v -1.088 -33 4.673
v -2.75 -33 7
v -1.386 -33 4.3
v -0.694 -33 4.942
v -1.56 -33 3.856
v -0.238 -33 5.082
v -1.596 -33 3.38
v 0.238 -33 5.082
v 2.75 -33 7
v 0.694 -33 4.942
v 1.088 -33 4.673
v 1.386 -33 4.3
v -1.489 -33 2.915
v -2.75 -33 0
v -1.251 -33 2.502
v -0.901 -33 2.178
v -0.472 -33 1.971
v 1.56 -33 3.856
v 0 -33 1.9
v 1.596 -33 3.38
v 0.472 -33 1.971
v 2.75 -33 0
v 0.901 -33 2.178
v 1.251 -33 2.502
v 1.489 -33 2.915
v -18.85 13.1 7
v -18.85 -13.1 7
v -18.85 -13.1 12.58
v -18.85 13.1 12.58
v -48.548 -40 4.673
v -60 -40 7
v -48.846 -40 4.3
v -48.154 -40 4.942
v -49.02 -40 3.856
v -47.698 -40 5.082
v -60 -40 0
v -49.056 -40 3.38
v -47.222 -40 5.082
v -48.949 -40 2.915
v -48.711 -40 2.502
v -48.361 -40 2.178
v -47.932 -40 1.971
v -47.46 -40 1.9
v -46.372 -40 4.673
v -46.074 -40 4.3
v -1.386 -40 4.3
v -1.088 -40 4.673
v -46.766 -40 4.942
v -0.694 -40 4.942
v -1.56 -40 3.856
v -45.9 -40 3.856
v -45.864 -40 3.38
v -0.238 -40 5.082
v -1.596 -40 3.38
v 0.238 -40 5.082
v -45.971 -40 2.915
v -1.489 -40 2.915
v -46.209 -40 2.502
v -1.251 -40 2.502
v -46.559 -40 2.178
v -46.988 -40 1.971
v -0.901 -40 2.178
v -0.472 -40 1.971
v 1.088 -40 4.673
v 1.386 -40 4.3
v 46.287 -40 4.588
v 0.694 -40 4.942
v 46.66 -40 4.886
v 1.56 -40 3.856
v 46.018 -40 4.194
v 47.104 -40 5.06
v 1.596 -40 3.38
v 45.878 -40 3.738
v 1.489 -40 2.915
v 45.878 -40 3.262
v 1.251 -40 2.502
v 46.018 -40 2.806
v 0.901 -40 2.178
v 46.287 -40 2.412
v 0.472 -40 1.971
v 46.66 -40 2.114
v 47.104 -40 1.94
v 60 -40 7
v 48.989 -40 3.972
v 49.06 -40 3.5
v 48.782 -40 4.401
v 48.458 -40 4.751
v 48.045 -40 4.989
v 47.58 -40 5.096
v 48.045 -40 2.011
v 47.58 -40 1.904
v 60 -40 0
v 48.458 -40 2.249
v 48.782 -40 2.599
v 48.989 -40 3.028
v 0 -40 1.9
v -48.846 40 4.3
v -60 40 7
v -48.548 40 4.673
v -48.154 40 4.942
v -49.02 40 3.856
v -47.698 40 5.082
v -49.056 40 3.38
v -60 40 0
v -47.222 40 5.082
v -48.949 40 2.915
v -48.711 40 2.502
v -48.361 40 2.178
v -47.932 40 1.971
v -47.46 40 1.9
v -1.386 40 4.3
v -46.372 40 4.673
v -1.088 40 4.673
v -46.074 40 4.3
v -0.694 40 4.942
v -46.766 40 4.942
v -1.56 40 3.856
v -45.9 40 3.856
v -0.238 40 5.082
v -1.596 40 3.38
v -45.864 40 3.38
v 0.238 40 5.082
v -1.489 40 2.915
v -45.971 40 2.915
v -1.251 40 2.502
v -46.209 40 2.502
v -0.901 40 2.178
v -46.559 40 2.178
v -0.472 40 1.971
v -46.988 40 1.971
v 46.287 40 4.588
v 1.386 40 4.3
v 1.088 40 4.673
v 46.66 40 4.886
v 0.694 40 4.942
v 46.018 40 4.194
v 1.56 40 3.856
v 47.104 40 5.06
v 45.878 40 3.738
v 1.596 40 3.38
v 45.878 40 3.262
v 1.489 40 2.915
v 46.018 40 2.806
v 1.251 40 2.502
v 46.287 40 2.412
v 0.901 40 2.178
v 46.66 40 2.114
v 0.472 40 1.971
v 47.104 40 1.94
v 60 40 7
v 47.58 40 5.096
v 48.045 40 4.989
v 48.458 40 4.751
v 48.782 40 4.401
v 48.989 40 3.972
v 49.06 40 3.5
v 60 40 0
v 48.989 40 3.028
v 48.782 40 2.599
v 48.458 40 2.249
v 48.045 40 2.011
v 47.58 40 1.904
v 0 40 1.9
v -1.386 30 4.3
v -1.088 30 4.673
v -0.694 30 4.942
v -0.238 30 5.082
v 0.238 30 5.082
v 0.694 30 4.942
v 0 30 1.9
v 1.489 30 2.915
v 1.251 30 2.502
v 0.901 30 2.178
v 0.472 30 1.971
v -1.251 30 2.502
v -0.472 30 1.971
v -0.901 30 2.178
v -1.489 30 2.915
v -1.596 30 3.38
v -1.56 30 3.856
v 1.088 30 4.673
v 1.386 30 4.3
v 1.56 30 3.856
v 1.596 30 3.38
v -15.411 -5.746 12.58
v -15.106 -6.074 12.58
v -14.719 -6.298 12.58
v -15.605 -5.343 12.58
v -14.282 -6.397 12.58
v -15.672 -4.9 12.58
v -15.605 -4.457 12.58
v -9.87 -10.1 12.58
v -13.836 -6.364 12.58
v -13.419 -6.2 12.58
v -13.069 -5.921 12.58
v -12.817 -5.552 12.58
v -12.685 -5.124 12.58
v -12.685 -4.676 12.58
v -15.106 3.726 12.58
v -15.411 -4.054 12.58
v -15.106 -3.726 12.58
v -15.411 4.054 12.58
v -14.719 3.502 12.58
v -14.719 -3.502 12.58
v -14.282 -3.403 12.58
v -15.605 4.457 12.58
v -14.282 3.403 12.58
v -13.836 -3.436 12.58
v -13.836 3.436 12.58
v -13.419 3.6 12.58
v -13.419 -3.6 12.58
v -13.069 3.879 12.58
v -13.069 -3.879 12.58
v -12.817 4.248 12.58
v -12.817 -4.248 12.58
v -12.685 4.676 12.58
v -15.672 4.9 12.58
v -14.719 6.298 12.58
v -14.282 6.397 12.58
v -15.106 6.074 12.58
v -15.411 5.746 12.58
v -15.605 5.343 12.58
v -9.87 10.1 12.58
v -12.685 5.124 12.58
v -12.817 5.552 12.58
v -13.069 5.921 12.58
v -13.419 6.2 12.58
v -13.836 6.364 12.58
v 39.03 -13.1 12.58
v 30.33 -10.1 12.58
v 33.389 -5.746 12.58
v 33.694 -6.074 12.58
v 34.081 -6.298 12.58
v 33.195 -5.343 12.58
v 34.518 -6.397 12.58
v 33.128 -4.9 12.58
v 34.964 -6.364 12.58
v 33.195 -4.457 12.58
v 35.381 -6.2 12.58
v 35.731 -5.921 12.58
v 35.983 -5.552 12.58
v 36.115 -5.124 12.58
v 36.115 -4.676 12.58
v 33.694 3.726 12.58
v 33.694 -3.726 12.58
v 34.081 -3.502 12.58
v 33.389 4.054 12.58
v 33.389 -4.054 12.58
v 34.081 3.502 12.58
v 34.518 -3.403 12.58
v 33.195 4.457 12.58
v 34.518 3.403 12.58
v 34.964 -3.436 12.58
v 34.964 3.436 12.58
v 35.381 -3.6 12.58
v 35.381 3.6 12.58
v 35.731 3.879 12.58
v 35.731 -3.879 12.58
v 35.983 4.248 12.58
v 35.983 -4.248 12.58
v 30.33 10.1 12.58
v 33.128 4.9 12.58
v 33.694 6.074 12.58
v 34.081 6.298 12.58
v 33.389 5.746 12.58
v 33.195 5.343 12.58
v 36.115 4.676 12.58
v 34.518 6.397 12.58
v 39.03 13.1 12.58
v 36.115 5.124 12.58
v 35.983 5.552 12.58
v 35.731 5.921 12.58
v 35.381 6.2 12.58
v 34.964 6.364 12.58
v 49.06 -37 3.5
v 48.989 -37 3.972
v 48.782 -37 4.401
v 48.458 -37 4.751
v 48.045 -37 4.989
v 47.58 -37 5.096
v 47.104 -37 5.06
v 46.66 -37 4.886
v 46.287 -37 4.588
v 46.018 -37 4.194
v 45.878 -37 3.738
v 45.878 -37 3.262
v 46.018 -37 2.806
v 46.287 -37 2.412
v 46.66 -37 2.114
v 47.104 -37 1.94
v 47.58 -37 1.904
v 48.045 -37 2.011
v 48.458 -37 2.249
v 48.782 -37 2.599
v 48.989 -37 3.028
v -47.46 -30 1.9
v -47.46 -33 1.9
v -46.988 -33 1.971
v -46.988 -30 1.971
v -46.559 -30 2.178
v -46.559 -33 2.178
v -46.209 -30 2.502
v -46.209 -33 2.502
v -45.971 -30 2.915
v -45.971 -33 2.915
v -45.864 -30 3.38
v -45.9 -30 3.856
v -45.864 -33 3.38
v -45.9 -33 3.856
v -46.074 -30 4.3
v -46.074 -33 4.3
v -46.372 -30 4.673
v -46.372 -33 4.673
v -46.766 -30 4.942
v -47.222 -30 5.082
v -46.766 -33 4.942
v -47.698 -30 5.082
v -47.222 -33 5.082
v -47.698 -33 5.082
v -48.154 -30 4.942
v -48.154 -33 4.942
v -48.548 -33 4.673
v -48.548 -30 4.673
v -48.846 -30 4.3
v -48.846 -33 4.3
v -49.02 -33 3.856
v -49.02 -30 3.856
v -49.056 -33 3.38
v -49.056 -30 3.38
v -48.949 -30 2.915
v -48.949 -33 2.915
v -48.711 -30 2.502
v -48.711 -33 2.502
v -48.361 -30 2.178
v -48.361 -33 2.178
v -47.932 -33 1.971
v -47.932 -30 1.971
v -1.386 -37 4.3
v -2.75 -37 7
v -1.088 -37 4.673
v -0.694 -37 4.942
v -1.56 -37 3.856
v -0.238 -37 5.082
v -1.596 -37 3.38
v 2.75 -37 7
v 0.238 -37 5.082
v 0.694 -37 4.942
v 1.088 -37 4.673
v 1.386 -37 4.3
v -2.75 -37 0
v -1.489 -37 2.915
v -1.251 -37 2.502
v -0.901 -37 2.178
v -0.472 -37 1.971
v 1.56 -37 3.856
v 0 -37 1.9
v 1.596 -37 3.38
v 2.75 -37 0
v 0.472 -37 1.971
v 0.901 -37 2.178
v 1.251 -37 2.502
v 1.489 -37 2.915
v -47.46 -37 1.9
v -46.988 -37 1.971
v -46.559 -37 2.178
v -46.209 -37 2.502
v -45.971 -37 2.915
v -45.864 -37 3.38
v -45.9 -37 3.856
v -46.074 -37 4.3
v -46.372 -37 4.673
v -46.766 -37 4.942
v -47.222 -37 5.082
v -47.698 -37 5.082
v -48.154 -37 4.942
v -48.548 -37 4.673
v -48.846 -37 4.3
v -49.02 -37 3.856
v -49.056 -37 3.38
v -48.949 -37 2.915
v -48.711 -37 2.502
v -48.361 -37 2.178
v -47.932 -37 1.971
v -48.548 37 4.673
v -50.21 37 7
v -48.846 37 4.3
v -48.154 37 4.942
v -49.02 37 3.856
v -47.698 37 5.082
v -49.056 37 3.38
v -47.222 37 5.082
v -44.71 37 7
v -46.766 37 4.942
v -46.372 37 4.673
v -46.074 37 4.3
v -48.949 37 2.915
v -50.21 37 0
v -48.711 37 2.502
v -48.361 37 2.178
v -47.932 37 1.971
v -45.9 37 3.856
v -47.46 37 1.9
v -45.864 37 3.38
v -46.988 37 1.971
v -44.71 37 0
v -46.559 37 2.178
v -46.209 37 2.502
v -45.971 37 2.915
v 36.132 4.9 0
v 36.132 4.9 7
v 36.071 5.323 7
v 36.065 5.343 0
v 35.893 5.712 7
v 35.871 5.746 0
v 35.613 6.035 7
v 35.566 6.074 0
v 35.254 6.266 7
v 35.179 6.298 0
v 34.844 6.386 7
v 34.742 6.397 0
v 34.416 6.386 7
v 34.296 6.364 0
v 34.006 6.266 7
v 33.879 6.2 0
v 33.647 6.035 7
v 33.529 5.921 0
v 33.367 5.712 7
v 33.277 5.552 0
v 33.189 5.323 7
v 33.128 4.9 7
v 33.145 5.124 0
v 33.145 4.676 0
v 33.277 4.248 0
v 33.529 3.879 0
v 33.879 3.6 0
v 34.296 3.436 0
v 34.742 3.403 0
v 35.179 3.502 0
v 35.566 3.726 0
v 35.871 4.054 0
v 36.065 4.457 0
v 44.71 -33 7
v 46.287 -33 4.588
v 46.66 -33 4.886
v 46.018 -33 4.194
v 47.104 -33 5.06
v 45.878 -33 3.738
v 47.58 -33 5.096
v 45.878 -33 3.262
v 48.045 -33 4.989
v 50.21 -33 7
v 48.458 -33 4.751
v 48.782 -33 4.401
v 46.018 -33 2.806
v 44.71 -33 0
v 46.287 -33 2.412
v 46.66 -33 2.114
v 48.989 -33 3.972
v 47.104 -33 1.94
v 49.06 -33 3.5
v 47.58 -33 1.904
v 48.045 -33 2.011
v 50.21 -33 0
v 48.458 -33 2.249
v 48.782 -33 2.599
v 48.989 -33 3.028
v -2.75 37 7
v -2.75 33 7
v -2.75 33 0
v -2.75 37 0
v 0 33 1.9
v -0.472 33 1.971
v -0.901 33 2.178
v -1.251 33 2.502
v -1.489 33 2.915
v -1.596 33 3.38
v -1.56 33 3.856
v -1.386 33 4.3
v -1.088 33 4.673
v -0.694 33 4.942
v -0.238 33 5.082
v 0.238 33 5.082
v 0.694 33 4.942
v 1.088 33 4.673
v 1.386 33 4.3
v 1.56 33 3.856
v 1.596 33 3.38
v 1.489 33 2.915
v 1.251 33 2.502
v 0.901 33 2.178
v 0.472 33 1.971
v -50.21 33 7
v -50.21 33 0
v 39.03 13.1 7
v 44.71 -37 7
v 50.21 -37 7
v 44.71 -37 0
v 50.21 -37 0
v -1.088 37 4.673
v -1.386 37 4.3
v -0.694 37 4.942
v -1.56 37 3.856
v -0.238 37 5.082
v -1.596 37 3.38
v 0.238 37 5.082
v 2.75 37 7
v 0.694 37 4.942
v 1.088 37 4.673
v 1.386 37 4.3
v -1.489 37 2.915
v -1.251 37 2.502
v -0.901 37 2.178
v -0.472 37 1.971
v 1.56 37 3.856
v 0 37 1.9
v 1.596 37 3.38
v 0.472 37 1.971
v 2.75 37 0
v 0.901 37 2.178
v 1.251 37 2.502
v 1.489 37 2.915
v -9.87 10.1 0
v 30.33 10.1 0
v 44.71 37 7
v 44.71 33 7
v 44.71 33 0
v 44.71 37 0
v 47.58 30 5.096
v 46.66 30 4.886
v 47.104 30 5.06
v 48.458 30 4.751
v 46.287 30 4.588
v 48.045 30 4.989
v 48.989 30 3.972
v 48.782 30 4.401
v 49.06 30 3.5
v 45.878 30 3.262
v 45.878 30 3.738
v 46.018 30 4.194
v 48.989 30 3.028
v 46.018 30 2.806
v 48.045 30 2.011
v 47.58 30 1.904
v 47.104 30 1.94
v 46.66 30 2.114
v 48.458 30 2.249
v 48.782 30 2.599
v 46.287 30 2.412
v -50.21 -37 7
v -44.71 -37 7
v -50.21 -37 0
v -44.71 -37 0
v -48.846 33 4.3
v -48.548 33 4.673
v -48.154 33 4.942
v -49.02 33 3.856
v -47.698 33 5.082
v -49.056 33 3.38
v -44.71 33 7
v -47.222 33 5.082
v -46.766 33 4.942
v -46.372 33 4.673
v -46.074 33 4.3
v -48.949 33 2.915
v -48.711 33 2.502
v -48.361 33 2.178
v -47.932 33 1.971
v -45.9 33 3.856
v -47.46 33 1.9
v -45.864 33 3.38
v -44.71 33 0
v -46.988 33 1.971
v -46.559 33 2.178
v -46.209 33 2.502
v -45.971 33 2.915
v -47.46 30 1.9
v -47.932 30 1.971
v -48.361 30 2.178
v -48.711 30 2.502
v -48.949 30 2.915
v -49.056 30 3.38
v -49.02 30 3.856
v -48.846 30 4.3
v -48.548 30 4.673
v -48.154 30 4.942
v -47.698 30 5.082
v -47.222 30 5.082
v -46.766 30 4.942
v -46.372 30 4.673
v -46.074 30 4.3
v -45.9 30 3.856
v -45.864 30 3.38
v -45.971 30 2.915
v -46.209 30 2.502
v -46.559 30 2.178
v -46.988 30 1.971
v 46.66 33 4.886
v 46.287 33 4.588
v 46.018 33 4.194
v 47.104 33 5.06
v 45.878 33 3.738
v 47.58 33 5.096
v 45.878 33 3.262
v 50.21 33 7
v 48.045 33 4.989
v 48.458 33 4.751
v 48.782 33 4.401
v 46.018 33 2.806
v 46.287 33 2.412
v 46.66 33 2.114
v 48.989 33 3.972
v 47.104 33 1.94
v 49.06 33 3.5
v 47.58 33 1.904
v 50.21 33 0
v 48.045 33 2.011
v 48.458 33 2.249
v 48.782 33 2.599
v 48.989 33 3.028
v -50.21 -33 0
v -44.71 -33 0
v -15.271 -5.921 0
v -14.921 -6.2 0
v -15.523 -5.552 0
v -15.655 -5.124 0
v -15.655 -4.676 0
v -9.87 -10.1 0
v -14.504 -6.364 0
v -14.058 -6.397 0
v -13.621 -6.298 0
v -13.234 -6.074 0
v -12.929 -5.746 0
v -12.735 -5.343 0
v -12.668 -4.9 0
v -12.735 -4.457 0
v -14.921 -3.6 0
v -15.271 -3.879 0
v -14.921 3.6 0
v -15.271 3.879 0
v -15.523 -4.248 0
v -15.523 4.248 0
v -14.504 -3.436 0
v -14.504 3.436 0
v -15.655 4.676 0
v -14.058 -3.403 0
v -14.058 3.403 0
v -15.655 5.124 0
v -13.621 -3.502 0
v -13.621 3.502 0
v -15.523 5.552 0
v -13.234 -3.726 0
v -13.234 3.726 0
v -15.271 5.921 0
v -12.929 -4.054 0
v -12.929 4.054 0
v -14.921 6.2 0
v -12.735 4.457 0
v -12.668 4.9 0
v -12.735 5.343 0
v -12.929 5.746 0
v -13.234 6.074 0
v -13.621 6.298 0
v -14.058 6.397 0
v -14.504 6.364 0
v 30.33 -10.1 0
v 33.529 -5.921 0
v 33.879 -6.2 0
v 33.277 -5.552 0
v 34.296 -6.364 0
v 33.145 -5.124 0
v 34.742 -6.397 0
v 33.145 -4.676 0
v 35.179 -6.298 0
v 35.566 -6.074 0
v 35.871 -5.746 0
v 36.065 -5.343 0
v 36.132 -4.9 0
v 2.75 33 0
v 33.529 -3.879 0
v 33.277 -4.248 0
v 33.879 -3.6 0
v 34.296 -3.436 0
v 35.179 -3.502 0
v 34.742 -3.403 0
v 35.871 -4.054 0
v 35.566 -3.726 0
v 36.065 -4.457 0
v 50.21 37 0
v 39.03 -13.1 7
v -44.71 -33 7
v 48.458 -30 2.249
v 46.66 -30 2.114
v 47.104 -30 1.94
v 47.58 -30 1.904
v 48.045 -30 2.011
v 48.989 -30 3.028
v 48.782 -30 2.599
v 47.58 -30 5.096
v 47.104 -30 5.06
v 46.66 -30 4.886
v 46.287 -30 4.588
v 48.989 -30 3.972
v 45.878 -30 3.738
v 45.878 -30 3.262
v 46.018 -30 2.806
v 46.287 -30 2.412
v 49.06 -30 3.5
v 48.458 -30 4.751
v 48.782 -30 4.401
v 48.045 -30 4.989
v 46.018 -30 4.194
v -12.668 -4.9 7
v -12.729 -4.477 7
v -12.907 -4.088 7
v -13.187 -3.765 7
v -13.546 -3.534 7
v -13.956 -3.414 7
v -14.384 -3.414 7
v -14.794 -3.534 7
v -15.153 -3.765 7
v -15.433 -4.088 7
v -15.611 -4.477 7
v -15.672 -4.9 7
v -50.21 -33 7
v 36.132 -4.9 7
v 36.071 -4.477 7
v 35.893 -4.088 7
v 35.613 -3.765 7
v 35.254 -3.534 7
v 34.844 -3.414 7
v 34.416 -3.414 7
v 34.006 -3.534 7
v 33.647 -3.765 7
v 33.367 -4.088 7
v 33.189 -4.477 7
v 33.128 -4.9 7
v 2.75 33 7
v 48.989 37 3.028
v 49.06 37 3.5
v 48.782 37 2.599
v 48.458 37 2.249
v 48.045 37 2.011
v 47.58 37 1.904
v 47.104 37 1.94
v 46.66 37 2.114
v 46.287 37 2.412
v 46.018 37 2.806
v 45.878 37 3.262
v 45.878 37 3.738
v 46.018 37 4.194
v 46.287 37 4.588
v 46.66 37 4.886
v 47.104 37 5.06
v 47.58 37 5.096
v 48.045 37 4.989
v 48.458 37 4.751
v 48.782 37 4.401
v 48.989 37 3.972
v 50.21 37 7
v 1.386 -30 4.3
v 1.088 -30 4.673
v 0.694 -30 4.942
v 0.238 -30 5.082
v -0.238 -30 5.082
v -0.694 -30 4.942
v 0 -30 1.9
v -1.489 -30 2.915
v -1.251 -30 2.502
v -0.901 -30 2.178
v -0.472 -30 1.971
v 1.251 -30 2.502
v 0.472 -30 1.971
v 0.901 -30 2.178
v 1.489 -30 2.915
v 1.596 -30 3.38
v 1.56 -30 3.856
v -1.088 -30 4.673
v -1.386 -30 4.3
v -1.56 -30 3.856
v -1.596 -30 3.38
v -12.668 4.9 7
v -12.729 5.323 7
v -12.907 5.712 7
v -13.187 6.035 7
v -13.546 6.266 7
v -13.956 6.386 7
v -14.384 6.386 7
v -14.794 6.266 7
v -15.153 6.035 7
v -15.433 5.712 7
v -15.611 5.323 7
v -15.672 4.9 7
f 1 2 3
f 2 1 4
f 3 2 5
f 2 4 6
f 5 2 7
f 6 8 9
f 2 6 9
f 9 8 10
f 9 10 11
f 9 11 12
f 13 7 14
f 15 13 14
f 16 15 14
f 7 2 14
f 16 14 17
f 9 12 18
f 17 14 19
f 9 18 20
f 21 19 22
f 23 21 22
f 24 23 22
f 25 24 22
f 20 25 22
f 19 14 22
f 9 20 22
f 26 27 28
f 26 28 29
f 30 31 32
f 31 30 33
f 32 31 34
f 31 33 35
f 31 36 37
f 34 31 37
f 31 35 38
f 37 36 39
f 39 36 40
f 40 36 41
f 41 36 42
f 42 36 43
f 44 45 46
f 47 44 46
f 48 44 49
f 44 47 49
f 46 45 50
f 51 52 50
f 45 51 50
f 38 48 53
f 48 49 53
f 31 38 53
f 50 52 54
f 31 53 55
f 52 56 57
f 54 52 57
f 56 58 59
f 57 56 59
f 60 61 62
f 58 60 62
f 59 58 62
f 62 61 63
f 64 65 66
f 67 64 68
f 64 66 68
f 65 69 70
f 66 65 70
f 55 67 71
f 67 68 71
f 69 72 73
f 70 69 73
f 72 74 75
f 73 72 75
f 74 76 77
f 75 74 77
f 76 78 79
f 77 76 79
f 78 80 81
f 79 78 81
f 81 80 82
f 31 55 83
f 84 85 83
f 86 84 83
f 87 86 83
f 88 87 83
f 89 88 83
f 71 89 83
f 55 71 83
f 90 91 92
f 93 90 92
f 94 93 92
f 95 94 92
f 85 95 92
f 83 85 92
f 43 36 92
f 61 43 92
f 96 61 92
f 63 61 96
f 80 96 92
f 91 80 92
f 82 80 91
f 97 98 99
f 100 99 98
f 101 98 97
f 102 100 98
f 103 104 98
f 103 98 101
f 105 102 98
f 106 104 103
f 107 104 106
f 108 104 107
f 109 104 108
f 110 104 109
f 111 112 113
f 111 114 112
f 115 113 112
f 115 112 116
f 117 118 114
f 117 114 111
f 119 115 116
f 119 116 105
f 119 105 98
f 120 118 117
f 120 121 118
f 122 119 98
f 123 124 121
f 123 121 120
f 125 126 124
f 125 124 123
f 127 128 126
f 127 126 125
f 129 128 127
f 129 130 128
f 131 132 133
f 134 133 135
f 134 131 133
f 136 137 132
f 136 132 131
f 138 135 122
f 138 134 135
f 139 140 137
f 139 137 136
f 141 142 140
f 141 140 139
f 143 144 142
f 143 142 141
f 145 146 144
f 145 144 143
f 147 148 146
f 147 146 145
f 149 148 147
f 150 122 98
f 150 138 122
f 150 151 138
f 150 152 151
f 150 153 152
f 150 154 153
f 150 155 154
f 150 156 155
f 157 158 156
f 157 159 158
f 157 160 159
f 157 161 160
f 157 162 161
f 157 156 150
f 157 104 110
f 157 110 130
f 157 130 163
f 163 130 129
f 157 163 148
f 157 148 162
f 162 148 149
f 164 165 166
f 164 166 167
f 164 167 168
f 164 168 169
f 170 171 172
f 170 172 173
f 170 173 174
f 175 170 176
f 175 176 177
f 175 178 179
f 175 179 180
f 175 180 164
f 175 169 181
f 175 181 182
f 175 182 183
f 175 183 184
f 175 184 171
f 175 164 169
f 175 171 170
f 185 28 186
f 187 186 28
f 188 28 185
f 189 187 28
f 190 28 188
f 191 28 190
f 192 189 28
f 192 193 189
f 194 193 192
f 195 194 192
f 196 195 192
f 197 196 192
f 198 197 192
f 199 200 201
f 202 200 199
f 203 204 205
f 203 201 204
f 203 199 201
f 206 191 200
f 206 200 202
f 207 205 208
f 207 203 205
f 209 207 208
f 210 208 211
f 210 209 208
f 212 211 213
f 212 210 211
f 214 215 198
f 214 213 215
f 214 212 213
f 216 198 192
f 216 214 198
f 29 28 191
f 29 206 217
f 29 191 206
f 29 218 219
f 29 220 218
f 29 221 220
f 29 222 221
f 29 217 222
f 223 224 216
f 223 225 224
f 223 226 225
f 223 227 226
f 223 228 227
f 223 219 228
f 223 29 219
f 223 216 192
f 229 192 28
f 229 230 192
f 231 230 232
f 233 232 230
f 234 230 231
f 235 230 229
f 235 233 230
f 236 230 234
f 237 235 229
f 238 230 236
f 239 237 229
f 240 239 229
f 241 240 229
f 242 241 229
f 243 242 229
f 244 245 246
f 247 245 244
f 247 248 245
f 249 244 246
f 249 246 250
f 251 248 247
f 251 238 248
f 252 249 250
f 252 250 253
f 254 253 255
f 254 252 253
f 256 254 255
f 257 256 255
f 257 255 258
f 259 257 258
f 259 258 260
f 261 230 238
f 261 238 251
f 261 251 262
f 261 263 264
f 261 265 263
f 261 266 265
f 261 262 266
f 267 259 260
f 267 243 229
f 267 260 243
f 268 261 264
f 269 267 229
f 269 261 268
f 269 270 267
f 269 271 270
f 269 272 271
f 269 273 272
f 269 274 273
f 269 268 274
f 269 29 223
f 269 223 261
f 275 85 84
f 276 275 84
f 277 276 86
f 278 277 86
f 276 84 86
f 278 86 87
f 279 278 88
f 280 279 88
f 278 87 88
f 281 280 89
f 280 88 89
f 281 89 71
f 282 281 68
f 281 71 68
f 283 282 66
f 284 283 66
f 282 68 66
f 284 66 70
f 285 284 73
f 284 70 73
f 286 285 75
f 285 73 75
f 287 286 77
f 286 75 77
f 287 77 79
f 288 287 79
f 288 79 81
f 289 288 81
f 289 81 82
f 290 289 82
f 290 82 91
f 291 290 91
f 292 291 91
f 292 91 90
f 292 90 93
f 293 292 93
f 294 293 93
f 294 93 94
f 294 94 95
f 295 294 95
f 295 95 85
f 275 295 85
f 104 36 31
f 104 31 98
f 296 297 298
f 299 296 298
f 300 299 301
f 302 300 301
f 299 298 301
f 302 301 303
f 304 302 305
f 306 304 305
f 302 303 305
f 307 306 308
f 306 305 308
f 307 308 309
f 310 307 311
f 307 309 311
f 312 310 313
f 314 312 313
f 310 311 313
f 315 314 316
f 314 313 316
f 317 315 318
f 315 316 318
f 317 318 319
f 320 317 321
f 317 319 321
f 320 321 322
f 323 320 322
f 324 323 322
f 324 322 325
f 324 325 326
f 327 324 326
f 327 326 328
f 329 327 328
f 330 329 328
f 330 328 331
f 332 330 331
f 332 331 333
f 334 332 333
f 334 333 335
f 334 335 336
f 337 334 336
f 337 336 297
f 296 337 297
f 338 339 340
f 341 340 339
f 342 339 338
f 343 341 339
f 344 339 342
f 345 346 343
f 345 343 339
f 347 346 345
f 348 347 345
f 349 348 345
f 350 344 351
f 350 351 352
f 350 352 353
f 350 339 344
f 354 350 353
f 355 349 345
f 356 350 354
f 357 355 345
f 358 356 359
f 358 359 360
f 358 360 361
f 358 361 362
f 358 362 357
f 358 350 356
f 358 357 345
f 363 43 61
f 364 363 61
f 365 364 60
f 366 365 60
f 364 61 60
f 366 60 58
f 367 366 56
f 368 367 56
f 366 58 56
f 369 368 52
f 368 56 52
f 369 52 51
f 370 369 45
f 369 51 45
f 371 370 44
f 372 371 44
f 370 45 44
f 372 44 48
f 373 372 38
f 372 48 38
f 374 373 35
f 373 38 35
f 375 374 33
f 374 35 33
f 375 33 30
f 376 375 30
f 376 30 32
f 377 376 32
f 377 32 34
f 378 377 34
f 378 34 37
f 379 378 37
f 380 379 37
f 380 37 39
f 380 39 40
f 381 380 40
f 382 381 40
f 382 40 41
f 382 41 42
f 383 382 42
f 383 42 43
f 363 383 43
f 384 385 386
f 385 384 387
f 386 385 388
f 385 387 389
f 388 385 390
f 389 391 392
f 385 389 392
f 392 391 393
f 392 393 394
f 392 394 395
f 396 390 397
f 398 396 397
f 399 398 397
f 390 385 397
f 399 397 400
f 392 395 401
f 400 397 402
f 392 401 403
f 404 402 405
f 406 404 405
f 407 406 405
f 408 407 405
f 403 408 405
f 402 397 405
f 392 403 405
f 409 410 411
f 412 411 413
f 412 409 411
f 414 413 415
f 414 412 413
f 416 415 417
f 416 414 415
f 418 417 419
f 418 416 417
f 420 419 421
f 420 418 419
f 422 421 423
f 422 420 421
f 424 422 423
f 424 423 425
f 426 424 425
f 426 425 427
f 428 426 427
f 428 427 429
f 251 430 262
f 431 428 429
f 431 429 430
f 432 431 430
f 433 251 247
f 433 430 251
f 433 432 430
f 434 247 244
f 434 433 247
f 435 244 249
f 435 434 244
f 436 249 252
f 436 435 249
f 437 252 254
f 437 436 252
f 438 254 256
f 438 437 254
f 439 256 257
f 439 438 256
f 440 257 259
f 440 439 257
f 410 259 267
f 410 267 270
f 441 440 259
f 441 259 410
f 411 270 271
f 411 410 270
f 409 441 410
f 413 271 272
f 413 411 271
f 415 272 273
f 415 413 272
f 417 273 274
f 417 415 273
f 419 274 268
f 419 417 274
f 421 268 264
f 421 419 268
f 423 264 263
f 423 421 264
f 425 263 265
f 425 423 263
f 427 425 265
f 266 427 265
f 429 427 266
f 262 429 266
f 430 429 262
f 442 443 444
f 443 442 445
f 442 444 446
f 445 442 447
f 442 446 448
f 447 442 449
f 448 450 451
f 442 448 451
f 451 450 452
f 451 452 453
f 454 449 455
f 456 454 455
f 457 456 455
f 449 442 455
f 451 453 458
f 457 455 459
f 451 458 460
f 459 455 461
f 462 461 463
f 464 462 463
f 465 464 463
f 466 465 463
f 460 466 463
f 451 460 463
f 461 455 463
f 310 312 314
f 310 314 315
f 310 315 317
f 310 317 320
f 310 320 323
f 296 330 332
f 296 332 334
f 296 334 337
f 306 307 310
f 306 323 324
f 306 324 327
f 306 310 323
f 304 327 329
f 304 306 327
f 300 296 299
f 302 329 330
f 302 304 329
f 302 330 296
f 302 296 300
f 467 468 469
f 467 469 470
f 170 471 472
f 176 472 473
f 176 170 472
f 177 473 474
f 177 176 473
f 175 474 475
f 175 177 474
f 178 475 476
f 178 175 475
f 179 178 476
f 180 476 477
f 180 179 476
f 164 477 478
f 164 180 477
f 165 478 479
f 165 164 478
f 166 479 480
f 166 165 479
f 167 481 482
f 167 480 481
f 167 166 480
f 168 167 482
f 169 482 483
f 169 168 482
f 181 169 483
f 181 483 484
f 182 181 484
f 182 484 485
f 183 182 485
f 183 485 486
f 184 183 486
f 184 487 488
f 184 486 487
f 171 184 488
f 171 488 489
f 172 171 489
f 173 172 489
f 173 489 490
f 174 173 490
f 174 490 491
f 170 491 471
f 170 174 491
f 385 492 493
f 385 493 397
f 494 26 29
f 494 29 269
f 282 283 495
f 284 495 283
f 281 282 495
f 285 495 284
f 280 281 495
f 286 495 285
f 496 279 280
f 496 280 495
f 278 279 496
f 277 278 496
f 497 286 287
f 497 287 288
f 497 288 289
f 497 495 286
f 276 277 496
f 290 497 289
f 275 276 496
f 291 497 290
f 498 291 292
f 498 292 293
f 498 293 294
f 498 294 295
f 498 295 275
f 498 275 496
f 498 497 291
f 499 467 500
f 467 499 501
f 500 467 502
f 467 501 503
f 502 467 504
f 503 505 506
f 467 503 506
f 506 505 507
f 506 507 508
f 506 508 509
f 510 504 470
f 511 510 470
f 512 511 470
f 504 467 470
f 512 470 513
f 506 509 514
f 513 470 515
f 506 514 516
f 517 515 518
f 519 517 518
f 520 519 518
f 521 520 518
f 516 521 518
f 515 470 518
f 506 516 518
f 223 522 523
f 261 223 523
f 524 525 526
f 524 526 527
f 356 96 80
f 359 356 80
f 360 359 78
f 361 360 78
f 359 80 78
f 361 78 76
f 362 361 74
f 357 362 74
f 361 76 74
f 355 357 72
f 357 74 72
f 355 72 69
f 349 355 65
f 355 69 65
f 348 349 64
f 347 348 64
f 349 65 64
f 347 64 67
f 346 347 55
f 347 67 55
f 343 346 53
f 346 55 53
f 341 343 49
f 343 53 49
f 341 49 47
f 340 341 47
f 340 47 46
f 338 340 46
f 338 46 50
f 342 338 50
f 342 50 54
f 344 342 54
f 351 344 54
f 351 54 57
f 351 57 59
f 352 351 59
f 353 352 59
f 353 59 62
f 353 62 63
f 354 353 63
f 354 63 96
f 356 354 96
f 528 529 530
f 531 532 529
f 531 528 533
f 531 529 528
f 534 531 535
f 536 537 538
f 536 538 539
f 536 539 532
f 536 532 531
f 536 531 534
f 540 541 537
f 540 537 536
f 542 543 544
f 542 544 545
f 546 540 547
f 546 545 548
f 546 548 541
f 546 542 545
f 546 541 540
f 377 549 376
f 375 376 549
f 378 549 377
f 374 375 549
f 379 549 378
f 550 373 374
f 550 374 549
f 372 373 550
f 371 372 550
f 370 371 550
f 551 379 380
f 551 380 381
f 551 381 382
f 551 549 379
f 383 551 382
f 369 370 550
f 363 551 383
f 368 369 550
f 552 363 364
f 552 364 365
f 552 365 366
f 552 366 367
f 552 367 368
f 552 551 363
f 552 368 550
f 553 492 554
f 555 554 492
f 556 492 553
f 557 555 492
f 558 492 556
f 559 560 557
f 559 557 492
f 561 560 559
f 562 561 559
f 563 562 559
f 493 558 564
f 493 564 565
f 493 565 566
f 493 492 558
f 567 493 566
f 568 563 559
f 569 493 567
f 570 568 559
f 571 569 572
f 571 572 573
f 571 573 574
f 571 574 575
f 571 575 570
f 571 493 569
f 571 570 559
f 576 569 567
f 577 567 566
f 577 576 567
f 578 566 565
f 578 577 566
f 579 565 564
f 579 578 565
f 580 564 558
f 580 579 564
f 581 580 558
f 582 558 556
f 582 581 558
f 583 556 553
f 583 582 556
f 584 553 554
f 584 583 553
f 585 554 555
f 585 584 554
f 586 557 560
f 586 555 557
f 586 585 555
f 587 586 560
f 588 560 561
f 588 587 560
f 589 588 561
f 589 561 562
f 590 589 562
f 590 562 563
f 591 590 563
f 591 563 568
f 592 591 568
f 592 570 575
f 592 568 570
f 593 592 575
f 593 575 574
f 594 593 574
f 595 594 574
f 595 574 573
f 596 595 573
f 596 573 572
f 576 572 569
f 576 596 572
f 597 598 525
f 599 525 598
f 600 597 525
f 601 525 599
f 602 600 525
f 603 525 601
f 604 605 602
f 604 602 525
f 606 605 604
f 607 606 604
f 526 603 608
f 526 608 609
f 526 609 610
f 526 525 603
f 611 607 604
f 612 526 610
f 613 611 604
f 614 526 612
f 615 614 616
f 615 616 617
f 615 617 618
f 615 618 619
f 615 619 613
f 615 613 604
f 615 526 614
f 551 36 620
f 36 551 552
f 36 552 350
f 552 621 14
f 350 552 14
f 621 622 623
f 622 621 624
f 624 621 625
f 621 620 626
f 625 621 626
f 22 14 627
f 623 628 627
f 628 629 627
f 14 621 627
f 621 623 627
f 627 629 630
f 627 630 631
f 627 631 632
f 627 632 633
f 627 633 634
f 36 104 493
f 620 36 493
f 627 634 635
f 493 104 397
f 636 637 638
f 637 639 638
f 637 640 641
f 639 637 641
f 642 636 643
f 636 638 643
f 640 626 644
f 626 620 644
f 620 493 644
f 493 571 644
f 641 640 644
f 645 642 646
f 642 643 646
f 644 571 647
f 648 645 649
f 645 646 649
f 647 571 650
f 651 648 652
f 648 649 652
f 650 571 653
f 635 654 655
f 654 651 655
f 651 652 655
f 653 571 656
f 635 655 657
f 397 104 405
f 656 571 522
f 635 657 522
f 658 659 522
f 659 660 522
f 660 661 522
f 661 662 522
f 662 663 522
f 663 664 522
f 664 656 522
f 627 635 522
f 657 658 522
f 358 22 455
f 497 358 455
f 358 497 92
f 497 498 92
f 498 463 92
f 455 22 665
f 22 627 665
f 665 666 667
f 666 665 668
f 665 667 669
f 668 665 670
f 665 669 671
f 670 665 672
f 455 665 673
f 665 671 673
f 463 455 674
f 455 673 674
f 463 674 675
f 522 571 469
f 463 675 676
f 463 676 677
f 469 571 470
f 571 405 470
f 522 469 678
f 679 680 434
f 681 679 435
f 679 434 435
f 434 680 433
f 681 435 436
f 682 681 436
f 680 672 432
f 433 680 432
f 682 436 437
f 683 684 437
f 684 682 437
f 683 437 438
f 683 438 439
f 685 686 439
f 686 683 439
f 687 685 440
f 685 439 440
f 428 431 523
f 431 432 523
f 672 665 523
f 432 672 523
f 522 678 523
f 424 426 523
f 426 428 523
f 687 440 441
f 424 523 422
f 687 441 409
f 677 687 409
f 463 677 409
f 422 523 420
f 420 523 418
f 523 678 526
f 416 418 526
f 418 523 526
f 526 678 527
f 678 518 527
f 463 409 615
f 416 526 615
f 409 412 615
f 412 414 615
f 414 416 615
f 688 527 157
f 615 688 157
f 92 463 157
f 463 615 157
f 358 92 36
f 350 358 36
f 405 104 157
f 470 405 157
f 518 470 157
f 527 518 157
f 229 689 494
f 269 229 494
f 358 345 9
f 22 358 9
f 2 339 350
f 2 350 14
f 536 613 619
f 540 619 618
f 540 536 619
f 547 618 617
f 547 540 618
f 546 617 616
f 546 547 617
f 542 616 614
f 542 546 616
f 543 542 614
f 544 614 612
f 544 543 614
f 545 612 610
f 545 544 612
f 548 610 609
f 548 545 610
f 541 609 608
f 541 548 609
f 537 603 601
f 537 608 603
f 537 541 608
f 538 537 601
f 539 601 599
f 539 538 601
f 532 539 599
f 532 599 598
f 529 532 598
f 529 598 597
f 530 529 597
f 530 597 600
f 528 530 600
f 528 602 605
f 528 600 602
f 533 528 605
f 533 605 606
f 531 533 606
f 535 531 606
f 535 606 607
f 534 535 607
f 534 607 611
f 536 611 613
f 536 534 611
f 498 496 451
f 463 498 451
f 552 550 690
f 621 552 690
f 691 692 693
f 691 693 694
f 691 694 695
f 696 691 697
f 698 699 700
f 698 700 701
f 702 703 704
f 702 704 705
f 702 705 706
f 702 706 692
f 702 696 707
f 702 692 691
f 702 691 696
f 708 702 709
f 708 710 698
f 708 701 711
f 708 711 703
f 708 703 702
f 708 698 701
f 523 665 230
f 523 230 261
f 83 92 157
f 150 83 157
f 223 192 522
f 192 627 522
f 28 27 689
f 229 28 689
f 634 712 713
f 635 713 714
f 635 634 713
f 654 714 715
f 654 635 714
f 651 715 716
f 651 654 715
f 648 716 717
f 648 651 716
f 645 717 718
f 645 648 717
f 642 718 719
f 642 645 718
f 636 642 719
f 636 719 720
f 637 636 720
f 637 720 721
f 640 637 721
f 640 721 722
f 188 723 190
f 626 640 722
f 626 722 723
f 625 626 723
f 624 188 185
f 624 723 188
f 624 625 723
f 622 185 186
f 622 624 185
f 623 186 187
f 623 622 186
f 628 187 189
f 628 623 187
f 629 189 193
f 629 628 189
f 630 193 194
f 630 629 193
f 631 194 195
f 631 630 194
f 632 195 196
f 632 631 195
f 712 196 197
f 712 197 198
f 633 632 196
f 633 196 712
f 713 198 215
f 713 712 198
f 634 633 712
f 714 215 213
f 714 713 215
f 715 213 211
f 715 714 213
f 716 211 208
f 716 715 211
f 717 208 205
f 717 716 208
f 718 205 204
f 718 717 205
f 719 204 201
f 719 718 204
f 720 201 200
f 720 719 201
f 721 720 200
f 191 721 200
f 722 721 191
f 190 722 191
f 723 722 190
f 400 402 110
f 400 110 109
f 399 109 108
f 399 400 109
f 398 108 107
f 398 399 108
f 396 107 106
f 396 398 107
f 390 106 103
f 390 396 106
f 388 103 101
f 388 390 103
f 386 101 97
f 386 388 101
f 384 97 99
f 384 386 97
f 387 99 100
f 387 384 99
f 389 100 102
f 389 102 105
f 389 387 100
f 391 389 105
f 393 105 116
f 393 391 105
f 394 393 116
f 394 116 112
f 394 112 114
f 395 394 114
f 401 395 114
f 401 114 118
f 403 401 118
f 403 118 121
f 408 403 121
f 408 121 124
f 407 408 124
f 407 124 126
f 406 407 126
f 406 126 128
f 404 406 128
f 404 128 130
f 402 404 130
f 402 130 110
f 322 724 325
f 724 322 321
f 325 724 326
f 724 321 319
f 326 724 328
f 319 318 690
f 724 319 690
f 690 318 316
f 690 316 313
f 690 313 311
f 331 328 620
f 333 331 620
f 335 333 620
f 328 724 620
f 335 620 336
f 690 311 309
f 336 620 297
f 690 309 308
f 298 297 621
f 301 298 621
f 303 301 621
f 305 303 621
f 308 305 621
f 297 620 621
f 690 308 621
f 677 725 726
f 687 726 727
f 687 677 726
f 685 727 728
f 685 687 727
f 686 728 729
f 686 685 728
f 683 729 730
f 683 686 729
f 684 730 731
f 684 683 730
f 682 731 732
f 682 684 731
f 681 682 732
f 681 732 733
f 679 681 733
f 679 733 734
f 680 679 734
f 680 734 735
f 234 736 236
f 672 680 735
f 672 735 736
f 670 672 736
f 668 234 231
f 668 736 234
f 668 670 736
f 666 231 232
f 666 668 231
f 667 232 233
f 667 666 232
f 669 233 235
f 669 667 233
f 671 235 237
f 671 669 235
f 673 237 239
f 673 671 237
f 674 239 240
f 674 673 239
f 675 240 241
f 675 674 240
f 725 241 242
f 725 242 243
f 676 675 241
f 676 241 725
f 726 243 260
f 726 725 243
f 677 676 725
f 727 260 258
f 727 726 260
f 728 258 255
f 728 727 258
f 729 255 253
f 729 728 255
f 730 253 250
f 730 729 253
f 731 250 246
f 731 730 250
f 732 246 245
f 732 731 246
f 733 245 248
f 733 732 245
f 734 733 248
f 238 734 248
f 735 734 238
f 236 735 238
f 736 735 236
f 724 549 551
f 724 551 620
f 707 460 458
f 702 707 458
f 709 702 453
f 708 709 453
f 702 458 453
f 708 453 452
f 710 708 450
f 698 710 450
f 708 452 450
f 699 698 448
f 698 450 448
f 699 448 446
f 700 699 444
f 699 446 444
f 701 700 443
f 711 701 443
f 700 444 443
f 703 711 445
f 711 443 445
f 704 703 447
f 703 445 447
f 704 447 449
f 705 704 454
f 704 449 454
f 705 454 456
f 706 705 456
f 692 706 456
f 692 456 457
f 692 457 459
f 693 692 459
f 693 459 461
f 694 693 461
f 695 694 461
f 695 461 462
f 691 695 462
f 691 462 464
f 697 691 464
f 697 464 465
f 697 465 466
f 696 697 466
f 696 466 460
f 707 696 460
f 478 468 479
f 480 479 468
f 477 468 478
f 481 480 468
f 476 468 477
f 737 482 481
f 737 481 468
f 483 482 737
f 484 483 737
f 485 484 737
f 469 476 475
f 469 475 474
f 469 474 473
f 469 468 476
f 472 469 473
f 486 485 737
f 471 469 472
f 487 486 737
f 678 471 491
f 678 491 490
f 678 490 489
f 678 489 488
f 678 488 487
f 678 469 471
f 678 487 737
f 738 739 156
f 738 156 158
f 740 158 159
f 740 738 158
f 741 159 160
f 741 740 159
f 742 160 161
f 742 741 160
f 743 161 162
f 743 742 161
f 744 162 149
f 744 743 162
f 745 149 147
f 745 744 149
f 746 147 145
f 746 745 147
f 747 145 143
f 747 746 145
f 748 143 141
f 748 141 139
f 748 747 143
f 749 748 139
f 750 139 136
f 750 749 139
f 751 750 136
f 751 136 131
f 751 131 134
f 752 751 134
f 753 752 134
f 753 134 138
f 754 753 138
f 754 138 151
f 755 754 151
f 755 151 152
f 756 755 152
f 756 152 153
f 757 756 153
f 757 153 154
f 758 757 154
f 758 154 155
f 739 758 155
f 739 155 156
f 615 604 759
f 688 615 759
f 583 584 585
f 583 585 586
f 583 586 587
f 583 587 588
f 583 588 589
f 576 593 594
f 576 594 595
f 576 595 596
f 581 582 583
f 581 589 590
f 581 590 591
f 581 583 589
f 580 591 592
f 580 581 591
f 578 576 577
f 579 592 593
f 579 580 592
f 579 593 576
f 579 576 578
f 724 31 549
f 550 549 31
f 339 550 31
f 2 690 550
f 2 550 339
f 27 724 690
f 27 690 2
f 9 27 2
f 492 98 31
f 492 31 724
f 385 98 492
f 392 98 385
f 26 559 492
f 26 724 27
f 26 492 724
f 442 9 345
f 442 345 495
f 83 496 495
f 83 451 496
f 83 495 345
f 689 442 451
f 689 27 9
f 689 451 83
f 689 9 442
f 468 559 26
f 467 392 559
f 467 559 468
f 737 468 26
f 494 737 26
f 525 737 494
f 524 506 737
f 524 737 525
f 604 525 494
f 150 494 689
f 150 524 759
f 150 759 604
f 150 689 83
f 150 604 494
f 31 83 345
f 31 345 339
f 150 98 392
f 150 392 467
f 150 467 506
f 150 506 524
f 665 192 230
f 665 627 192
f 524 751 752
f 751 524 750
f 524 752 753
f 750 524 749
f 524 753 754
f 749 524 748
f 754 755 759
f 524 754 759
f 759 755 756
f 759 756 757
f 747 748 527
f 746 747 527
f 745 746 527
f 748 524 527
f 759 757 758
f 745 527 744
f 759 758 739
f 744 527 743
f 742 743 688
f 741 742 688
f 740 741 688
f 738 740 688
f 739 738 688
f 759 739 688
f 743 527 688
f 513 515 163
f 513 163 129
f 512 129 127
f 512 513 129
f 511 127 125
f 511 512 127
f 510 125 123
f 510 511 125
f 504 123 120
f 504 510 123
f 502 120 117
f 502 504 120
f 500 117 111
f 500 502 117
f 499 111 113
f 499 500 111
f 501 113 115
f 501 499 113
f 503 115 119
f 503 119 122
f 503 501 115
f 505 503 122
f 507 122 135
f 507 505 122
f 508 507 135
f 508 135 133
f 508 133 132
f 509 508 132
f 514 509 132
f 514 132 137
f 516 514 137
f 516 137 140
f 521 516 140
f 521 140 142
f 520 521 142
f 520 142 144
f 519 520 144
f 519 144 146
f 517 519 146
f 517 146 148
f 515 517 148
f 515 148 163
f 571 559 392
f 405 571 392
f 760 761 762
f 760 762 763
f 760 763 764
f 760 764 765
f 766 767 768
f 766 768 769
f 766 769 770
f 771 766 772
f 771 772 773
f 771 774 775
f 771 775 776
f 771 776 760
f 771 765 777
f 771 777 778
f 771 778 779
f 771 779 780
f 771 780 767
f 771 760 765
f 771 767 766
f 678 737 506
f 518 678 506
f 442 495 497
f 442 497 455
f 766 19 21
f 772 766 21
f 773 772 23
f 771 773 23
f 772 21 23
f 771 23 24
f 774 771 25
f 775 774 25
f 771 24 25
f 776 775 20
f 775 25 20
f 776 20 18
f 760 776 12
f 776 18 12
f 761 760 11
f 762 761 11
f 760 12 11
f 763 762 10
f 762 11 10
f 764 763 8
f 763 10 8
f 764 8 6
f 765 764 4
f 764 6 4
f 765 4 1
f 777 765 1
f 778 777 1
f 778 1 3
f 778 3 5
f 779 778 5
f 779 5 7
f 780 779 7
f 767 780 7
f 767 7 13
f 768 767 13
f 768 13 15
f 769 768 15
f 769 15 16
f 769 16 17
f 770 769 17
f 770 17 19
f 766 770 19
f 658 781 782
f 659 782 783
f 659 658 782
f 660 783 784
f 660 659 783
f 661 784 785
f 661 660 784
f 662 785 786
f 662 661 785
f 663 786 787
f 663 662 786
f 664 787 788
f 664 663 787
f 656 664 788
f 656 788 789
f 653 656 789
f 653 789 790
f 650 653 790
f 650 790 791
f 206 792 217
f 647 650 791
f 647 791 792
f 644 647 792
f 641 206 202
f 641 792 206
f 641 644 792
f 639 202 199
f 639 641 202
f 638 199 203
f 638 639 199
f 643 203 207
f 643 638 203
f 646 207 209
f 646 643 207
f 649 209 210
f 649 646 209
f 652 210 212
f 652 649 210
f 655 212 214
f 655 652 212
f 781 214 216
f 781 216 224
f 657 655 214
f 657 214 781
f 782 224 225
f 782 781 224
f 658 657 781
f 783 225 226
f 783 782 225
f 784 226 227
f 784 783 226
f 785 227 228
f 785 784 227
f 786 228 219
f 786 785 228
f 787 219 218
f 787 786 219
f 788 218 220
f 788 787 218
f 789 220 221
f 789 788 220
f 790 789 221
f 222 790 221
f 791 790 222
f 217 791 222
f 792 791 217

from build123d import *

# Parameters (mm, degrees)
ESBO_O1_W                = 120
ESBO_O1_H                = 80
ESBO_O1_R                = 1.501648648
ESBO_O1_W_2              = 40.2
ESBO_O1_H_2              = 20.2
ESBO_O1_W_3              = 5.5
ESBO_O1_H_3              = 4
RESSALTO_EXTRUS_O4_DEPTH = 7
RESSALTO_EXTRUS_O5_START = 7
ESBO_O1_12_W             = 57.88
ESBO_O1_12_H             = 26.2
ESBO_O1_12_R             = 1.501648648
ESBO_O1_12_W_2           = 40.2
ESBO_O1_12_H_2           = 20.2
RESSALTO_EXTRUS_O5_DEPTH = 5.58
ESBO_O9_R                = 1.6
CORTE_EXTRUS_O7_DEPTH    = 10
CORTE_EXTRUS_O8_START    = -10
ESBO_O10_R               = 1.6
CORTE_EXTRUS_O8_DEPTH    = 10


with BuildPart() as part:
    # Esboço1 → Ressalto-extrusão4 (new body)
    with BuildSketch(Plane.XY):
        Rectangle(ESBO_O1_W, ESBO_O1_H)
        with Locations((34.63, -4.9)):
            Circle(ESBO_O1_R, mode=Mode.SUBTRACT)
        with Locations((34.63, 4.9)):
            Circle(ESBO_O1_R, mode=Mode.SUBTRACT)
        with Locations((-14.17, -4.9)):
            Circle(ESBO_O1_R, mode=Mode.SUBTRACT)
        with Locations((-14.17, 4.9)):
            Circle(ESBO_O1_R, mode=Mode.SUBTRACT)
        with Locations((10.23, 0)):
            Rectangle(ESBO_O1_W_2, ESBO_O1_H_2, mode=Mode.SUBTRACT)
        with Locations((-47.46, -35)):
            Rectangle(ESBO_O1_W_3, ESBO_O1_H_3, mode=Mode.SUBTRACT)
        with Locations((47.46, -35)):
            Rectangle(ESBO_O1_W_3, ESBO_O1_H_3, mode=Mode.SUBTRACT)
        with Locations((0, -35)):
            Rectangle(ESBO_O1_W_3, ESBO_O1_H_3, mode=Mode.SUBTRACT)
        with Locations((47.46, 35)):
            Rectangle(ESBO_O1_W_3, ESBO_O1_H_3, mode=Mode.SUBTRACT)
        with Locations((0, 35)):
            Rectangle(ESBO_O1_W_3, ESBO_O1_H_3, mode=Mode.SUBTRACT)
        with Locations((-47.46, 35)):
            Rectangle(ESBO_O1_W_3, ESBO_O1_H_3, mode=Mode.SUBTRACT)
    extrude(amount=RESSALTO_EXTRUS_O4_DEPTH)

    # Esboço1<12> → Ressalto-extrusão5 (add)
    with BuildSketch(Plane.XY.offset(RESSALTO_EXTRUS_O5_START)):
        with Locations((10.09, 0)):
            Rectangle(ESBO_O1_12_W, ESBO_O1_12_H)
        with Locations(Location((-14.17, 4.9, 0), (0, 0, 180))):
            Circle(ESBO_O1_12_R, mode=Mode.SUBTRACT)
        with Locations(Location((34.63, 4.9, 0), (0, 0, 180))):
            Circle(ESBO_O1_12_R, mode=Mode.SUBTRACT)
        with Locations(Location((34.63, -4.9, 0), (0, 0, 180))):
            Circle(ESBO_O1_12_R, mode=Mode.SUBTRACT)
        with Locations(Location((-14.17, -4.9, 0), (0, 0, 180))):
            Circle(ESBO_O1_12_R, mode=Mode.SUBTRACT)
        with Locations((10.23, 0)):
            Rectangle(ESBO_O1_12_W_2, ESBO_O1_12_H_2, mode=Mode.SUBTRACT)
    extrude(amount=RESSALTO_EXTRUS_O5_DEPTH)

    # Esboço9 → Corte-extrusão7 (cut)
    with BuildSketch(Plane.XZ.offset(40)):
        with Locations(Location((-47.46, 3.5, 0), (0, 0, 270))):
            Circle(ESBO_O9_R)
        with Locations(Location((0, 3.5, 0), (0, 0, 270))):
            Circle(ESBO_O9_R)
        with Locations((47.46, 3.5)):
            Circle(ESBO_O9_R)
    extrude(amount=-CORTE_EXTRUS_O7_DEPTH, mode=Mode.SUBTRACT)

    # Esboço10 → Corte-extrusão8 (cut)
    with BuildSketch(Plane(origin=(0, 40, 0), x_dir=(1, 0, 0), z_dir=(0, 1, 0)).offset(CORTE_EXTRUS_O8_START)):
        with Locations(Location((-47.46, -3.5, 0), (0, 0, 90))):
            Circle(ESBO_O10_R)
        with Locations(Location((0, -3.5, 0), (0, 0, 90))):
            Circle(ESBO_O10_R)
        with Locations((47.46, -3.5)):
            Circle(ESBO_O10_R)
    extrude(amount=CORTE_EXTRUS_O8_DEPTH, mode=Mode.SUBTRACT)


solid = part.part
